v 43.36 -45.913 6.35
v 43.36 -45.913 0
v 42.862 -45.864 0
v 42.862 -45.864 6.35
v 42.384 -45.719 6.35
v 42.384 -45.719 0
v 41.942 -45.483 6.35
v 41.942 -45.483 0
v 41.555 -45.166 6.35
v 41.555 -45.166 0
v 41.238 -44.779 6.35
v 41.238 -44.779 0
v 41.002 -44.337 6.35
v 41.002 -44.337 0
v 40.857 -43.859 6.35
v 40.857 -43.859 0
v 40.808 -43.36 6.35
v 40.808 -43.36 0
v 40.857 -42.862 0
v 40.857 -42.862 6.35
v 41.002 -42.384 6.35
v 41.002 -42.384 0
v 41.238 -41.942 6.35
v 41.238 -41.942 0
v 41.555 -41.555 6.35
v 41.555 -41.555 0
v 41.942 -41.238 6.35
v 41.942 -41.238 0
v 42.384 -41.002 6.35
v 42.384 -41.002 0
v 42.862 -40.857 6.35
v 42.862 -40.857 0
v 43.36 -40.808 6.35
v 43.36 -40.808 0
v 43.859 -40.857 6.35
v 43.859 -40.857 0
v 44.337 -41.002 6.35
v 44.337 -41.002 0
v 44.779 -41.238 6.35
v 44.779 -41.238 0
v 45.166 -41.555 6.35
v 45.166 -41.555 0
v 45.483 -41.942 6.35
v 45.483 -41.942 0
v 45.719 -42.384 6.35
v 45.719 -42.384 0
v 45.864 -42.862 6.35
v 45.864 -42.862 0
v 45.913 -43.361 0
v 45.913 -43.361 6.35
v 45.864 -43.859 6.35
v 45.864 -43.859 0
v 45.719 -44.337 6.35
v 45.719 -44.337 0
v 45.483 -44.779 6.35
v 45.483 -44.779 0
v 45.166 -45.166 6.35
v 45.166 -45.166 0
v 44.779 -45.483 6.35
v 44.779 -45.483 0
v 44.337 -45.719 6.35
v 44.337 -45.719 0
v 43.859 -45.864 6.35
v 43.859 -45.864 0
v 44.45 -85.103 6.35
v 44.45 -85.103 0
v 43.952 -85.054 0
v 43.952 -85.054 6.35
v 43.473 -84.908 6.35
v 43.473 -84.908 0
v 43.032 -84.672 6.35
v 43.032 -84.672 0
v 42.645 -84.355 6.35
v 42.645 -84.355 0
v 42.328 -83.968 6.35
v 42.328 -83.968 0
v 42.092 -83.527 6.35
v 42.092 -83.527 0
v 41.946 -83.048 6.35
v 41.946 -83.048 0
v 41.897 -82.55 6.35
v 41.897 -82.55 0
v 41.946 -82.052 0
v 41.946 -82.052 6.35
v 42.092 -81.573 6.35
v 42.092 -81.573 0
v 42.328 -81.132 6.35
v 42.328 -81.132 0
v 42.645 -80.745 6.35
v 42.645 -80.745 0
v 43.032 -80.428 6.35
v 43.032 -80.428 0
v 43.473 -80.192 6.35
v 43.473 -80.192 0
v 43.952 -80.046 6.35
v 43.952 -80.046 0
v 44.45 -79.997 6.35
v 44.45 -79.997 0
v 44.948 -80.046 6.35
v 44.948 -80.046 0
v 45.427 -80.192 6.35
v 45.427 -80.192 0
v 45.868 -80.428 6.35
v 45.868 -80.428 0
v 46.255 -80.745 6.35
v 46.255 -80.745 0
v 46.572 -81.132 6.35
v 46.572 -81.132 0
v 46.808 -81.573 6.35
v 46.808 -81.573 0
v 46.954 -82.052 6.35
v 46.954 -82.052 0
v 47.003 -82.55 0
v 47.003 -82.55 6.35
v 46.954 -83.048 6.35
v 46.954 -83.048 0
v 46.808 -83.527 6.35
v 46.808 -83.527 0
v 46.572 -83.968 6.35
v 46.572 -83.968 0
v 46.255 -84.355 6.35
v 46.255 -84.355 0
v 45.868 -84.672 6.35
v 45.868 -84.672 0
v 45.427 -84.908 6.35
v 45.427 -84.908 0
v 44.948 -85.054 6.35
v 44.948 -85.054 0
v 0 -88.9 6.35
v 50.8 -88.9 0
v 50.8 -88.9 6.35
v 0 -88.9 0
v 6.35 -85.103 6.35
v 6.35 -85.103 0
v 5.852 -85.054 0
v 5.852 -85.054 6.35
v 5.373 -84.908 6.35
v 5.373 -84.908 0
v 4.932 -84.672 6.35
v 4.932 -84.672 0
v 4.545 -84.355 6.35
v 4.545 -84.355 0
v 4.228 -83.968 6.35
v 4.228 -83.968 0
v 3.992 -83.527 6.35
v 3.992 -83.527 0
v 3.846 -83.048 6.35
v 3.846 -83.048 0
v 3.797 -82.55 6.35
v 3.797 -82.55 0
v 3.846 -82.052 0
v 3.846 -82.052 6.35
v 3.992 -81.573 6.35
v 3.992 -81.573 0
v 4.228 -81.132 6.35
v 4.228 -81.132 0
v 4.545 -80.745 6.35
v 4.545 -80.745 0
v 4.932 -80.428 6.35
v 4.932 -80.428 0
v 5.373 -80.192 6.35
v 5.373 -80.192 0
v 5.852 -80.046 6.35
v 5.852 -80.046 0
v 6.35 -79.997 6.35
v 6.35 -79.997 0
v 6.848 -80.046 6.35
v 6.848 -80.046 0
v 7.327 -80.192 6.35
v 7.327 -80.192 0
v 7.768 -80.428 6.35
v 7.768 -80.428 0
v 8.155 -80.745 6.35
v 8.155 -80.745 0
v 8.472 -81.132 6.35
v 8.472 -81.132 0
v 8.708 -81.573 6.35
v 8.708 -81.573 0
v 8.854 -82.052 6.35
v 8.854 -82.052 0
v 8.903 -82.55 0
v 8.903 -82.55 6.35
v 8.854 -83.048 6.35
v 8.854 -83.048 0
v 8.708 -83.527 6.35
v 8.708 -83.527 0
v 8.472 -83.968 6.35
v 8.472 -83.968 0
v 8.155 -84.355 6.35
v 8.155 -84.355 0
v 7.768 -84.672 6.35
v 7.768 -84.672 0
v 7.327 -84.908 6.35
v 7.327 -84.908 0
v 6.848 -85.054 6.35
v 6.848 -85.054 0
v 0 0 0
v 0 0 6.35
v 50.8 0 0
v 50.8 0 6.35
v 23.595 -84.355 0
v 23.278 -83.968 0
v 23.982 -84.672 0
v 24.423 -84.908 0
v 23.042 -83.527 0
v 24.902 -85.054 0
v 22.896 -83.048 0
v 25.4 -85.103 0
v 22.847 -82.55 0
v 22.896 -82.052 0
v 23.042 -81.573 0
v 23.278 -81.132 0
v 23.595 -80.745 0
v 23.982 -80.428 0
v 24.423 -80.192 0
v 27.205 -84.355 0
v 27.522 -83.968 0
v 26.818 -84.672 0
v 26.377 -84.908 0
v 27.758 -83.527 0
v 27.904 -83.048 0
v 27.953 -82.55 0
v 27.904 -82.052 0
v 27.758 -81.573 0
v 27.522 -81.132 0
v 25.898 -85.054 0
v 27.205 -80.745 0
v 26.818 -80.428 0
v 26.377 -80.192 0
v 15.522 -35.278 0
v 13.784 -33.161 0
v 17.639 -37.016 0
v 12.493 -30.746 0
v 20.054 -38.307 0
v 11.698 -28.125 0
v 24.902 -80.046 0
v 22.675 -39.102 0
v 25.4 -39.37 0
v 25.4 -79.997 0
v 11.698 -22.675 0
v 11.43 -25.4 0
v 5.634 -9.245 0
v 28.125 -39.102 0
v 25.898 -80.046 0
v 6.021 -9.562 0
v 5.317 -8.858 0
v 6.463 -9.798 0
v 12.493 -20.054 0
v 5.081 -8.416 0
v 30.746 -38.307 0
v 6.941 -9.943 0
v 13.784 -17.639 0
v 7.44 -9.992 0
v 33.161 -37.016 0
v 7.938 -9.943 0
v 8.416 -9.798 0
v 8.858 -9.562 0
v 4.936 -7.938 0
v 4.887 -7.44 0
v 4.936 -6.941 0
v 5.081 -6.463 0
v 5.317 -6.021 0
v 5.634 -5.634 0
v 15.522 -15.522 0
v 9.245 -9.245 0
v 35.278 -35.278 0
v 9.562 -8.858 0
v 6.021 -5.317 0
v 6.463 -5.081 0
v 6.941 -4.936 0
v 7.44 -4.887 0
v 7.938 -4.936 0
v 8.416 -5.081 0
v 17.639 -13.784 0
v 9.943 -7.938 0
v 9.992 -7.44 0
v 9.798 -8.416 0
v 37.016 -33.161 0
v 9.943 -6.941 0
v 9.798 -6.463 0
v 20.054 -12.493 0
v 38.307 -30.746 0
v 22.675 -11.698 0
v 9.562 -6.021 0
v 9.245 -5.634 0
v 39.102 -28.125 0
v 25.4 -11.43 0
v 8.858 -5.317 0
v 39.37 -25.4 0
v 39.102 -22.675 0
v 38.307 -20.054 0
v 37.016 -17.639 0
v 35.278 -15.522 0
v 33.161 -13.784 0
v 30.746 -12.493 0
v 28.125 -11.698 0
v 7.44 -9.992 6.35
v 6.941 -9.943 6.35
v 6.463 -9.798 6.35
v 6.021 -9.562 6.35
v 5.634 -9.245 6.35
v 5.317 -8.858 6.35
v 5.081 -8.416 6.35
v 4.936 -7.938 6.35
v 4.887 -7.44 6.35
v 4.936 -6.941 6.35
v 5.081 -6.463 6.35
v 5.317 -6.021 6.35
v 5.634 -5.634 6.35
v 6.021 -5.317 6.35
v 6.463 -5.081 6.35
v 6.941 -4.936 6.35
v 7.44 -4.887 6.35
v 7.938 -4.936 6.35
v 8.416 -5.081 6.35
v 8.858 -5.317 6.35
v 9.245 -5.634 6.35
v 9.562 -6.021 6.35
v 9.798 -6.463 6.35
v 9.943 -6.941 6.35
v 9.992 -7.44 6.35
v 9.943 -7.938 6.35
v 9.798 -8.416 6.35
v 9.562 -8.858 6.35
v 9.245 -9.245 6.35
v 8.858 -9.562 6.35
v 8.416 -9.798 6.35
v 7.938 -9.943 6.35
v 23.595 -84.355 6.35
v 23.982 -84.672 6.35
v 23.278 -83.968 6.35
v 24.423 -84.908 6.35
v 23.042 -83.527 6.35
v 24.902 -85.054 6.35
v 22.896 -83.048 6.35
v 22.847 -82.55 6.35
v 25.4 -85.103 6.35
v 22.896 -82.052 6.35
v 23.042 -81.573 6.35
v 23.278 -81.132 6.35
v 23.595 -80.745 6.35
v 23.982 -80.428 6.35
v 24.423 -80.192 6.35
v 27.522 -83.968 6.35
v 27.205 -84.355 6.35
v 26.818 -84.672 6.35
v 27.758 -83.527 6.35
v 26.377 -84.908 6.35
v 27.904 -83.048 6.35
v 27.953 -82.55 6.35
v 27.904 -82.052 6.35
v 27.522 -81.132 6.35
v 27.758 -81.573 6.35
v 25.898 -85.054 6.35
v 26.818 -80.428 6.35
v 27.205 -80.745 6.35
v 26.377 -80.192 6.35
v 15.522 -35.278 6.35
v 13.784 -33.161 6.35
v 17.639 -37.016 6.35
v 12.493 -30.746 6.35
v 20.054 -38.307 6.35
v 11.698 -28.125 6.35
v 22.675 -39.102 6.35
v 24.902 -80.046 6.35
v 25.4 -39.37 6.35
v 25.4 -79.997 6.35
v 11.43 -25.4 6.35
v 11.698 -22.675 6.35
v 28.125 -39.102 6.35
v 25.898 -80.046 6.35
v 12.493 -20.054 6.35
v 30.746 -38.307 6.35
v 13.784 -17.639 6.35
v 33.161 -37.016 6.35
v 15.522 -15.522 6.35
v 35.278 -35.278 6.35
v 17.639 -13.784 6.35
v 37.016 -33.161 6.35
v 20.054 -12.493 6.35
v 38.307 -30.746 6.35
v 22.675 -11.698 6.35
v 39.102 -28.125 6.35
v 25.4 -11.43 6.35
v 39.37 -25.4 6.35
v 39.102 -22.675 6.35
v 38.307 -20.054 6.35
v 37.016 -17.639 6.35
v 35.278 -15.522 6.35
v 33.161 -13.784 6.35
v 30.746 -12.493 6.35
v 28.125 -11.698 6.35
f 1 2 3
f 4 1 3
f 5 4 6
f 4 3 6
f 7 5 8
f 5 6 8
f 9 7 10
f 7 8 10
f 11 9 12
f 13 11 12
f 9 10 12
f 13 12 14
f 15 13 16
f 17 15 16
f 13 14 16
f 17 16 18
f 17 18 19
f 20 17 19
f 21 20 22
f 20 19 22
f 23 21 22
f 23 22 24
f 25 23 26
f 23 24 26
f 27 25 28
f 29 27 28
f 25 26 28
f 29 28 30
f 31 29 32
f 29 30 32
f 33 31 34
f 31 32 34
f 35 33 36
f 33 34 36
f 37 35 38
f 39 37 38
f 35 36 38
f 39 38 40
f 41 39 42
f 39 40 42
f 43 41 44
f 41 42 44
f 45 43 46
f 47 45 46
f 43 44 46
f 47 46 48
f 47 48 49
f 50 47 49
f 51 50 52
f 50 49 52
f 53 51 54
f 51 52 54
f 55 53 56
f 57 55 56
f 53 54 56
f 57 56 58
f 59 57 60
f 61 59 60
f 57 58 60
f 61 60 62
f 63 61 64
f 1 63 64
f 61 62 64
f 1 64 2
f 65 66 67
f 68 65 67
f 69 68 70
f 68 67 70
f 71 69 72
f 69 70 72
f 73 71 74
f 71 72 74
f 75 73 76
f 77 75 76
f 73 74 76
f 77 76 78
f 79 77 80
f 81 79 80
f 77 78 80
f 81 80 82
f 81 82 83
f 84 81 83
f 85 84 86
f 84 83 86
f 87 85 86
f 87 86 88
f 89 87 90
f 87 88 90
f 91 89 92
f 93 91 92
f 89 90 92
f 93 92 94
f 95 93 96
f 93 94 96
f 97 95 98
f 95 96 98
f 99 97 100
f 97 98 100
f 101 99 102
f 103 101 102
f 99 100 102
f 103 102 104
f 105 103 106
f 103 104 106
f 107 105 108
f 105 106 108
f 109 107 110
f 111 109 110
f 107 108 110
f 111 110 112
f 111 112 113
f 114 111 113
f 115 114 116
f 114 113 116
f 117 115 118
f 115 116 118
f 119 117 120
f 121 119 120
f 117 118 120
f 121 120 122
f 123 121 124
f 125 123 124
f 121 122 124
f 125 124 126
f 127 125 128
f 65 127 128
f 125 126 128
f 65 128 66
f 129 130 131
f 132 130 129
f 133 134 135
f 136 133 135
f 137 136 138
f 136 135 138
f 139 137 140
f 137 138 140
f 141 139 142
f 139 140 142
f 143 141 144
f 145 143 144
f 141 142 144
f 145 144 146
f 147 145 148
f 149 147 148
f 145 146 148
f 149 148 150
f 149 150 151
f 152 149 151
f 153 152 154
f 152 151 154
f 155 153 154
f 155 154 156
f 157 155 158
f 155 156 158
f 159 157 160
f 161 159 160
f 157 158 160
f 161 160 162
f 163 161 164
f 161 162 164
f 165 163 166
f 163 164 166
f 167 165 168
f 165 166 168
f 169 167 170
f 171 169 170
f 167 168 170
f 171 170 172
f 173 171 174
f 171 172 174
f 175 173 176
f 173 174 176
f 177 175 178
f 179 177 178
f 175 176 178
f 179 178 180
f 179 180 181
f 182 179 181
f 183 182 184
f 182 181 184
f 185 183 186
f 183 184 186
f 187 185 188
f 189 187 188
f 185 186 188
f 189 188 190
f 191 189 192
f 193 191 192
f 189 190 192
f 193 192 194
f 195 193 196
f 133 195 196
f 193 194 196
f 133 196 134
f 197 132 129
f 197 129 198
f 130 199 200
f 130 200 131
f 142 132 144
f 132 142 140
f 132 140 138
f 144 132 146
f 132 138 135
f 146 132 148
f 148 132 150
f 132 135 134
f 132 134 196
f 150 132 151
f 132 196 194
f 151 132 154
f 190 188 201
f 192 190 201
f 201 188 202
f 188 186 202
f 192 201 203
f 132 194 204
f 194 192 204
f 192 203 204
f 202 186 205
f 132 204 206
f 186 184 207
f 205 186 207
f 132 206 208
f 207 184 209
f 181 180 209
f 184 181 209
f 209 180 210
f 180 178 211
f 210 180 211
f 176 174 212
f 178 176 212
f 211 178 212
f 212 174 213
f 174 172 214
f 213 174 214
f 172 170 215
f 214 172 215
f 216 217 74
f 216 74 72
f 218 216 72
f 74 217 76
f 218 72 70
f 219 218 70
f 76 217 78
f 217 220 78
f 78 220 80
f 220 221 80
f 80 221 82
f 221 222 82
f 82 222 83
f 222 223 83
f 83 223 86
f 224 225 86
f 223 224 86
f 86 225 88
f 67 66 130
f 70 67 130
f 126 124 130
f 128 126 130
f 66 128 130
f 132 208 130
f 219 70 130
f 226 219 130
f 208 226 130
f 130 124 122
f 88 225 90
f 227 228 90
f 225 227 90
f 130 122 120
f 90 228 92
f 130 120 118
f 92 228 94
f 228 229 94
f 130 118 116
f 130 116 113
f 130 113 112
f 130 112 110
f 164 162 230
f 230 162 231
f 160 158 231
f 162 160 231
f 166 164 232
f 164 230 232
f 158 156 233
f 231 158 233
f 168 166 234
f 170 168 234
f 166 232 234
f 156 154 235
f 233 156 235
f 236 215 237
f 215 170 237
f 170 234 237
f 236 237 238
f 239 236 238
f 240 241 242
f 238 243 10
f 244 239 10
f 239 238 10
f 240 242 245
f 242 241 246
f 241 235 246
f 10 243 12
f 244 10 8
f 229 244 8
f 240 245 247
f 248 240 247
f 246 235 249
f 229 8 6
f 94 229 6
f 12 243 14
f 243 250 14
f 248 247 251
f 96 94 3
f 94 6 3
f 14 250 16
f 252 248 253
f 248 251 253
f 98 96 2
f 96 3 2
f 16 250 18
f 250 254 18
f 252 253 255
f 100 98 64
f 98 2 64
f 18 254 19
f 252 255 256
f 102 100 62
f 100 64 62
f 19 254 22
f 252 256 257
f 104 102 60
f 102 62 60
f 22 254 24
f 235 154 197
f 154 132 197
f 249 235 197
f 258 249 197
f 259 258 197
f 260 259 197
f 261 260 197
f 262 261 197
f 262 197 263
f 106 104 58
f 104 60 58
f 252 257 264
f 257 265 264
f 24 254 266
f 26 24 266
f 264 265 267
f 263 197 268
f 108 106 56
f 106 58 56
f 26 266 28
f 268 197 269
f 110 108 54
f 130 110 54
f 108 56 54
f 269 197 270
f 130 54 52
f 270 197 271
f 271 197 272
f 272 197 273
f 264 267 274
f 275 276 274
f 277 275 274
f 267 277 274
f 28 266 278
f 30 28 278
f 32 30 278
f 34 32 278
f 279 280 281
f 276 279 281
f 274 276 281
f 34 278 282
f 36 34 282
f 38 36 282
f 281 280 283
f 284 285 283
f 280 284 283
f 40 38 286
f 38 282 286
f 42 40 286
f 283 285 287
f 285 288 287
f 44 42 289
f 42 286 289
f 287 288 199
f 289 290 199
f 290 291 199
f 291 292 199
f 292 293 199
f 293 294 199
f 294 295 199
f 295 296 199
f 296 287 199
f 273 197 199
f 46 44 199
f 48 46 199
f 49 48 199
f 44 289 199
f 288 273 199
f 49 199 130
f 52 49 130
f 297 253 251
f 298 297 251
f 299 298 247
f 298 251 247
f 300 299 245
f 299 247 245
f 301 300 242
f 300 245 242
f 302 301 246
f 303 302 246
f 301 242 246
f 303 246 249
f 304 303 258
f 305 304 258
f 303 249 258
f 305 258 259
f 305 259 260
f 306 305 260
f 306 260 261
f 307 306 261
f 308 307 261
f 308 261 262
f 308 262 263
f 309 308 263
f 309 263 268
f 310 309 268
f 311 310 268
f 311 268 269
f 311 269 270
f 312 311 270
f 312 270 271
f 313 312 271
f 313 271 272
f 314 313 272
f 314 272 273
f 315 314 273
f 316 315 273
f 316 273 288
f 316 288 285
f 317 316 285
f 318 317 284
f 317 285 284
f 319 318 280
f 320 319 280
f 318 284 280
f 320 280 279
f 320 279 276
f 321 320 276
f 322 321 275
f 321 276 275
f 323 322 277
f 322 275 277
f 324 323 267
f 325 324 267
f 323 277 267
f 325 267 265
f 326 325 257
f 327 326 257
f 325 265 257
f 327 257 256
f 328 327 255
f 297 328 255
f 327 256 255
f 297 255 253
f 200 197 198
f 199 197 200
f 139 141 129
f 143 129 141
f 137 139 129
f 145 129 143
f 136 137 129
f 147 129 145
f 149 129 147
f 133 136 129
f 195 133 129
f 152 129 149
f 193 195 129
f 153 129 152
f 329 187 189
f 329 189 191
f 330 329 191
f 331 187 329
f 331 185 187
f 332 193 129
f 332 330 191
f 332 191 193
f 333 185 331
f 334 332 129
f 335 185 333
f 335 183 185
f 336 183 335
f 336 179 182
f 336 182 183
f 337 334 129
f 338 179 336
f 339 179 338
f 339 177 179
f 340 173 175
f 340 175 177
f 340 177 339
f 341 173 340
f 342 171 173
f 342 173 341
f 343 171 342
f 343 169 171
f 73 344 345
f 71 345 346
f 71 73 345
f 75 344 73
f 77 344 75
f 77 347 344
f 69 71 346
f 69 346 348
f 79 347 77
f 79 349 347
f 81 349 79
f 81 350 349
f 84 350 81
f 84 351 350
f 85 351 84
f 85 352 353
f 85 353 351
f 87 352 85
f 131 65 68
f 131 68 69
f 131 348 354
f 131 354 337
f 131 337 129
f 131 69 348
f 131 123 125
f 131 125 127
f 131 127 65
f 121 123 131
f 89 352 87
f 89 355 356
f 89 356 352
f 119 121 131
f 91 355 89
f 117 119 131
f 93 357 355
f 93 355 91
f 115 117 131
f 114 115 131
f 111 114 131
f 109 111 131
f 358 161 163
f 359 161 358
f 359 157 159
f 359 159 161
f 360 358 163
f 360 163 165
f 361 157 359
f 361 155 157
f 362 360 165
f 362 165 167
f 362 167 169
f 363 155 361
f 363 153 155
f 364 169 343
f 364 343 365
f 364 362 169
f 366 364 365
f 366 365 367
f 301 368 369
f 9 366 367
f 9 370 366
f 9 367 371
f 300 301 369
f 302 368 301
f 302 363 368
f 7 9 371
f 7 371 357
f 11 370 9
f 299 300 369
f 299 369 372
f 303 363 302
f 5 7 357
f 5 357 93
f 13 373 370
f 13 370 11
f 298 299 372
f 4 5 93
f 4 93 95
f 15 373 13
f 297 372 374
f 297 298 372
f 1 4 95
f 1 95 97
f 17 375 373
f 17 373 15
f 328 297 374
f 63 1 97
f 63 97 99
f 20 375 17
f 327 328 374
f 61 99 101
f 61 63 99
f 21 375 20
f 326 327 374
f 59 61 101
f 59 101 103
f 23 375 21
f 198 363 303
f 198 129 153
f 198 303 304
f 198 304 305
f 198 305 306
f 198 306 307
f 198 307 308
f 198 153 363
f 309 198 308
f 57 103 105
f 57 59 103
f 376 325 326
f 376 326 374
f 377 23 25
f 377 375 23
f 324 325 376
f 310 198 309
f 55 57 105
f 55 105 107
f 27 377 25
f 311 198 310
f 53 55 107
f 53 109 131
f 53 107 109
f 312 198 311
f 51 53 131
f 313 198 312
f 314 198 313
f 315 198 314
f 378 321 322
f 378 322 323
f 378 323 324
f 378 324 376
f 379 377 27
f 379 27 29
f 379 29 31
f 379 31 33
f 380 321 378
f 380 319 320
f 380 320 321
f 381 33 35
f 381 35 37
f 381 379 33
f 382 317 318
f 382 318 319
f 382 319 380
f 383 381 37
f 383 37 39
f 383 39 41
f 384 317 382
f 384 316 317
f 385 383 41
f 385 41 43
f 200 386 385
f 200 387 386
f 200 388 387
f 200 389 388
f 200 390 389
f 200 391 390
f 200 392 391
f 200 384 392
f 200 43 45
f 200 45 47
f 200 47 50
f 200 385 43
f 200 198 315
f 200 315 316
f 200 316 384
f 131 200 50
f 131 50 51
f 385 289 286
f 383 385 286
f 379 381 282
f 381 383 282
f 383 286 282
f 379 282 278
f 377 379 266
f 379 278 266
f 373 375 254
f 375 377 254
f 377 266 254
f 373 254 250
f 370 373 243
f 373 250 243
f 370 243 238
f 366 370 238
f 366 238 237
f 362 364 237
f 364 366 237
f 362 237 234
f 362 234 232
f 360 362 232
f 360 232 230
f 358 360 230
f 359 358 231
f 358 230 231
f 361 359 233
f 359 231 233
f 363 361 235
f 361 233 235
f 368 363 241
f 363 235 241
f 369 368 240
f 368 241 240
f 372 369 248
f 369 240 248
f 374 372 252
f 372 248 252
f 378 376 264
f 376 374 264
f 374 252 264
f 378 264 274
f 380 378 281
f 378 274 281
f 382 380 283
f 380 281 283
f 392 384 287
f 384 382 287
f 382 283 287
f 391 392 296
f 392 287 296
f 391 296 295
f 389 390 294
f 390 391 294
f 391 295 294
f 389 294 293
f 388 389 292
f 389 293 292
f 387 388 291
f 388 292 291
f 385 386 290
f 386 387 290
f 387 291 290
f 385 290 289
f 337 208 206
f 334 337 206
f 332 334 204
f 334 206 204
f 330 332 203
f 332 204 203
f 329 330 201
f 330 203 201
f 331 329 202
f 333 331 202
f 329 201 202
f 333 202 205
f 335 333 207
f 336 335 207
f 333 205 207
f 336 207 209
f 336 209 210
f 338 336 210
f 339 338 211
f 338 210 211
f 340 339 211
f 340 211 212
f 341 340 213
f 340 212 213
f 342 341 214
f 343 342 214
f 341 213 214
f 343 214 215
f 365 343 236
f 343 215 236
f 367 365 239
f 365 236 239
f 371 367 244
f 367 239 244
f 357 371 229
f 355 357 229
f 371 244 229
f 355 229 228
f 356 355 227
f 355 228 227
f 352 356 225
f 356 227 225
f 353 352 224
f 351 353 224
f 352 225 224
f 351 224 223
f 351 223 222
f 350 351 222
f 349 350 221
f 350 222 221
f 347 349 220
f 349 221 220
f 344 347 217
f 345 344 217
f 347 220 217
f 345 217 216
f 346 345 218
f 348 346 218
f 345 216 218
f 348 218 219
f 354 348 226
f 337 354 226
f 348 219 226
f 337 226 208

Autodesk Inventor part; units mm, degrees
ref_plane "YZ Plane" through (0, 0, 0) normal (1, 0, 0) x (0, 1, 0)
ref_plane "XZ Plane" through (0, 0, 0) normal (0, 1, 0) x (-1, 0, 0)
ref_plane "XY Plane" through (0, 0, 0) normal (0, 0, 1) x (1, 0, 0)
sketch "Sketch1" plane through (0, 0, 0) normal (0, 0, 1) x (1, 0, 0)
  line L0 (0, 0) -> (50.8, 0)
  line L1 (50.8, 0) -> (50.8, -50.8)
  line L2 (50.8, -50.8) -> (0, -50.8)
  line L3 (0, -50.8) -> (0, 0)
  line L4 (0, -50.8) -> (50.8, -50.8)
  line L5 (50.8, -50.8) -> (50.8, -88.9)
  line L6 (50.8, -88.9) -> (0, -88.9)
  line L7 (0, -88.9) -> (0, -50.8)
  line L8 (0, 0) -> (50.8, -50.8) construction
  circle A0 centre (25.4, -25.4) radius 13.97
  point P0 (42.0116, -42.0116)
  dimension "d0" = 50.8
  dimension "d1" = 50.8
  dimension "d2" = 38.1
  dimension "d3" = 27.94
extrude "Extrusion1" add sketch "Sketch1" along normal blind 6.35
sketch "Sketch2" plane through (0, 0, 6.35) normal (0, 0, 1) x (1, 0, 0)
  circle A0 centre (25.4, -25.4) radius 13.97 construction
  circle A1 centre (25.4, -25.4) radius 25.4 construction
  line L0 (25.4, -25.4) -> (7.4395, -7.4395) construction
  line L1 (25.4, -25.4) -> (50.8, -25.4) construction
  line L2 (25.4, -25.4) -> (43.3605, -43.3605) construction
  line L3 (25.4, -25.4) -> (50.8, -25.4) construction
  point P0 (0, 0)
  dimension "d6" = 50.8
  dimension "d7" = 25.4
  dimension "d8" = 135
  dimension "d9" = 45
hole "Hole1" at (7.4395, -7.4395, 6.35) at (43.3605, -43.3605, 6.35) direction (0, 0, -1) diameter 5.1054 depth 10.795 clearance for "Hex Machine Screw" size "#10" standard "Ansi Unified Screw Threads"
sketch "Sketch3" plane through (0, 0, 6.35) normal (0, 0, 1) x (1, 0, 0)
  line L0 (0, -88.9) -> (50.8, -88.9) construction
  line L1 (50.8, -88.9) -> (50.8, 0) construction
  line L2 (0, -88.9) -> (50.8, -88.9) construction
  line L3 (50.8, -88.9) -> (50.8, -82.55) construction
  line L4 (50.8, -82.55) -> (0, -82.55) construction
  line L5 (0, -82.55) -> (0, -88.9) construction
  line L6 (0, -82.55) -> (25.4, -82.55) construction
  line L7 (25.4, -82.55) -> (50.8, -82.55) construction
  point P0 (0, 0)
  point P1 (6.35, -82.55)
  point P2 (44.45, -82.55)
  dimension "d17" = 6.35
  dimension "d18" = 19.05
  dimension "d19" = 19.05
hole "Hole2" at (25.4, -82.55, 6.35) at (6.35, -82.55, 6.35) at (44.45, -82.55, 6.35) direction (0, 0, -1) diameter 5.1054 depth 10.795 clearance for "Hex Machine Screw" size "#10" standard "Ansi Unified Screw Threads"
chamfer "Chamfer1" [suppressed]
properties part number "Versaplanetary Mount"
